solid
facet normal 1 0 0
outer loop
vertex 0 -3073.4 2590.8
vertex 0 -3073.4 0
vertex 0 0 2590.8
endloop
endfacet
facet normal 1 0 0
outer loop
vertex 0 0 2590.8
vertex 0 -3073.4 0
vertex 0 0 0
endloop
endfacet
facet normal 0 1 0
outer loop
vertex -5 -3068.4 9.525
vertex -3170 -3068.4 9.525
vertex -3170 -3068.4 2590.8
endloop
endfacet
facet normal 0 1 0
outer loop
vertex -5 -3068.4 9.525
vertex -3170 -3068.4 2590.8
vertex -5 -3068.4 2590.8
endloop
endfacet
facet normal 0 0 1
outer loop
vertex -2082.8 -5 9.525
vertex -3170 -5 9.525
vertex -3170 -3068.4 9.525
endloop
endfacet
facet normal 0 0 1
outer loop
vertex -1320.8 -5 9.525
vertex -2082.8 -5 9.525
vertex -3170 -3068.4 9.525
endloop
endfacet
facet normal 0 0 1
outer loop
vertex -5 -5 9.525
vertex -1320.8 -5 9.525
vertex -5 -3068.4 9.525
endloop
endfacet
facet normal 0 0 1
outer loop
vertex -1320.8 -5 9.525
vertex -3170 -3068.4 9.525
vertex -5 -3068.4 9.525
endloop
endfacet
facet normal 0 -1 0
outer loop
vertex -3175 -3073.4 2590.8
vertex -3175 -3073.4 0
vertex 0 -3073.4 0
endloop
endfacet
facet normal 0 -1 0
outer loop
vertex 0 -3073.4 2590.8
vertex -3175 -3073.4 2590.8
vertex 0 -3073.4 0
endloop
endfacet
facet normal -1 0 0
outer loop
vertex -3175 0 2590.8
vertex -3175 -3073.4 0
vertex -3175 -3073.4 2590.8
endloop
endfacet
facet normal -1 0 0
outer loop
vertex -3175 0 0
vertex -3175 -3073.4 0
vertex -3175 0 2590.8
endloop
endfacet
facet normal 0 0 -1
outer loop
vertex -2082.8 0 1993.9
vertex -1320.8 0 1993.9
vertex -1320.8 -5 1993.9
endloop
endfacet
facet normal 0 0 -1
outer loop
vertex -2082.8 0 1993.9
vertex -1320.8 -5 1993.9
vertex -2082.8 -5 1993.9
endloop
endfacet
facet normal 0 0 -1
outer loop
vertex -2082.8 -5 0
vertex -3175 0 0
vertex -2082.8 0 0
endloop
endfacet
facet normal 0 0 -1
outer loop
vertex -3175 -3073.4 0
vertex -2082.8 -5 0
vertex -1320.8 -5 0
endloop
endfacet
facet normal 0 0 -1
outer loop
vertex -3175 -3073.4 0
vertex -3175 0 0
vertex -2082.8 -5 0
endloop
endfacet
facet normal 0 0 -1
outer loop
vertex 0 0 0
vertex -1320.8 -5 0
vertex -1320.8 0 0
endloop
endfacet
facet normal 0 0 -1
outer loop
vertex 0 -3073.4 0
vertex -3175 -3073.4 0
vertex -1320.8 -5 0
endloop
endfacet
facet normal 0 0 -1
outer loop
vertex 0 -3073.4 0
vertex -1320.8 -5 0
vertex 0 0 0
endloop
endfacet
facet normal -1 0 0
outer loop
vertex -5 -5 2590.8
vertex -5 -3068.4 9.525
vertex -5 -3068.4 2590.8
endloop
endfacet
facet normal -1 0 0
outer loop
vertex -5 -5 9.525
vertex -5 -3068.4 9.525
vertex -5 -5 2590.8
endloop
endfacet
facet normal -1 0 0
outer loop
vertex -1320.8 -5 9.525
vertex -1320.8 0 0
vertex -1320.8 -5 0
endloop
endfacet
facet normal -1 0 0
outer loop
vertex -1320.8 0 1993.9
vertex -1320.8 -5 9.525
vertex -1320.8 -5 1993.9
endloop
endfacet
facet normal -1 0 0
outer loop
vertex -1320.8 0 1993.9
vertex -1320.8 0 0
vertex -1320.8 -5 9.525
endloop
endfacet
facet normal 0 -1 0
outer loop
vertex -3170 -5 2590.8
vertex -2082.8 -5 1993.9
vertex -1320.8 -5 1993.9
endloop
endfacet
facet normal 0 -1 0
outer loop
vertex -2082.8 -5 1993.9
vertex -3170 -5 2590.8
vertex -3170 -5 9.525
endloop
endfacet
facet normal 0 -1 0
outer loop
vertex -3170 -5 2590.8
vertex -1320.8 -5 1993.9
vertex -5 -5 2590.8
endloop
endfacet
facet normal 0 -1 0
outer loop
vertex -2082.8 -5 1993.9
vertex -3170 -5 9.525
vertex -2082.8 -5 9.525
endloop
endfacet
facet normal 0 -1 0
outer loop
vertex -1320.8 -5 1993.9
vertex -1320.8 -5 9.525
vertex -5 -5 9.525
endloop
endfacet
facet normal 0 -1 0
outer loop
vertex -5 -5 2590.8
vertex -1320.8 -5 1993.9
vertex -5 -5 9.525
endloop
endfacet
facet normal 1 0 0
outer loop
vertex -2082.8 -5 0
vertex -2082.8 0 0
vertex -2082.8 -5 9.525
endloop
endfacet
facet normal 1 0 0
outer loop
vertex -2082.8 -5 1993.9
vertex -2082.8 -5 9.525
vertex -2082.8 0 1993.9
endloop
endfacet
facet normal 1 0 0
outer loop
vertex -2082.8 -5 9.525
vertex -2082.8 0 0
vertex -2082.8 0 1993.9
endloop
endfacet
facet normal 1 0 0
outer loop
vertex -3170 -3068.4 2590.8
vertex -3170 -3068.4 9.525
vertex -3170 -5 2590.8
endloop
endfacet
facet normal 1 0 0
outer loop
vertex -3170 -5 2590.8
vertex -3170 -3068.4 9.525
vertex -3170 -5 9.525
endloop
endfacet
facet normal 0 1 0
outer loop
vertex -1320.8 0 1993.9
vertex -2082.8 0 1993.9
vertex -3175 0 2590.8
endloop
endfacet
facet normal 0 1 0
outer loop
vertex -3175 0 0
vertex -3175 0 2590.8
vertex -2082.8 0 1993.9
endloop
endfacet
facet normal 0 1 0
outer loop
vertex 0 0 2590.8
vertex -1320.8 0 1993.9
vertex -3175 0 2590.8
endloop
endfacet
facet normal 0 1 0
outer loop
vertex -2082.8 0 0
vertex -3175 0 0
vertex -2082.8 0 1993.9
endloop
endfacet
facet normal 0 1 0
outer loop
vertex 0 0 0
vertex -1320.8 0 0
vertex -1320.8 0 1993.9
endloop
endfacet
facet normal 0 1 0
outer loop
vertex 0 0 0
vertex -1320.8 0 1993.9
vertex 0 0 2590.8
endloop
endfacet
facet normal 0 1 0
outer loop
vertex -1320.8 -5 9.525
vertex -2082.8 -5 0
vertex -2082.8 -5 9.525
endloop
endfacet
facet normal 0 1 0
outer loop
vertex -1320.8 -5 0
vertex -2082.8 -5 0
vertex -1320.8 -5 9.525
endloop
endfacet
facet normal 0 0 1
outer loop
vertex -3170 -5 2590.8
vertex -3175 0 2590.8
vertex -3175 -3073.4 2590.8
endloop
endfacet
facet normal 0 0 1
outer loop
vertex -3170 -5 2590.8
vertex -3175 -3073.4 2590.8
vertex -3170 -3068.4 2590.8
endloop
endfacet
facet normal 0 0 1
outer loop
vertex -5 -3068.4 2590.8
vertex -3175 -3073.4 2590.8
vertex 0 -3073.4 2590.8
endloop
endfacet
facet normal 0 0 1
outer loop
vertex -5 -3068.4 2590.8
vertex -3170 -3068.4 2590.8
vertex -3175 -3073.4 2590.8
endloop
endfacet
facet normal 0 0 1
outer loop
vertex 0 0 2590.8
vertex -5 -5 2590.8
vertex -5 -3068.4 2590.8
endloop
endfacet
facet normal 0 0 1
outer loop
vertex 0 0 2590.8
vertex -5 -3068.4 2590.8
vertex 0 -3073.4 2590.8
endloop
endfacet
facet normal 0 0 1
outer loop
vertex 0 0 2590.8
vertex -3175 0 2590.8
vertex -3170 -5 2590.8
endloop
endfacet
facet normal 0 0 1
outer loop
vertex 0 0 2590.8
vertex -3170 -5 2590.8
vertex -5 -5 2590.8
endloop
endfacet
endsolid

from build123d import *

# Parameters (mm, degrees)
SKETCH_W     = 3175
SKETCH_H     = 3073.4
SKETCH_W_2   = 3165
SKETCH_H_2   = 3063.4
PAD_DEPTH    = 2590.8
SKETCH001_W  = 762
SKETCH001_H  = 1993.9
POCKET_DEPTH = 107.95
SKETCH002_W  = 3165
SKETCH002_H  = 3063.4
PAD001_DEPTH = 9.525


with BuildPart() as part:
    # Sketch → Pad (new body)
    with BuildSketch(Plane.XY):
        with Locations((-1587.5, -1536.7)):
            Rectangle(SKETCH_W, SKETCH_H)
        with Locations((-1587.5, -1536.7)):
            Rectangle(SKETCH_W_2, SKETCH_H_2, mode=Mode.SUBTRACT)
    extrude(amount=PAD_DEPTH)

    # Sketch001 (on Face1 of Pad) → Pocket (cut)
    with BuildSketch(Plane(origin=(0, 0, 0), x_dir=(-1, 0, 0), z_dir=(0, 1, 0))):
        with Locations((1701.8, 996.95)):
            Rectangle(SKETCH001_W, SKETCH001_H)
    extrude(amount=-POCKET_DEPTH, mode=Mode.SUBTRACT)

    # Sketch002 (on Face2 of Pocket) → Pad001 (join)
    with BuildSketch(Plane(origin=(0, 0, 0), x_dir=(1, 0, 0), z_dir=(0, 0, -1))):
        with Locations((-1587.5, 1536.7)):
            Rectangle(SKETCH002_W, SKETCH002_H)
    extrude(amount=-PAD001_DEPTH)


solid = part.part
